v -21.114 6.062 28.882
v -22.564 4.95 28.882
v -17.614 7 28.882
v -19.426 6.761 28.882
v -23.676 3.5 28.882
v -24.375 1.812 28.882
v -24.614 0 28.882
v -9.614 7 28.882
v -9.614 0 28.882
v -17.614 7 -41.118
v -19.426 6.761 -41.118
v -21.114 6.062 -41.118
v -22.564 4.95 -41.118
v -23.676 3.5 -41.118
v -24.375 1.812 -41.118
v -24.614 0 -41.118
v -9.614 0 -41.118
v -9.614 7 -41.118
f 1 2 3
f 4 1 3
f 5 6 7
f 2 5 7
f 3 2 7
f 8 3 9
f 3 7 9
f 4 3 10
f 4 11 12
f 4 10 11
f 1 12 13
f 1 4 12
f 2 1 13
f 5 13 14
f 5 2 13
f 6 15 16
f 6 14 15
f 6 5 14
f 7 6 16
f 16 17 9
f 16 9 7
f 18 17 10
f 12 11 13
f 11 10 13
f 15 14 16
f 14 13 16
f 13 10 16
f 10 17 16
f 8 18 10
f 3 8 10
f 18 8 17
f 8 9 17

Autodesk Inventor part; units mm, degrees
ref_plane "YZ Plane" through (0, 0, 0) normal (1, 0, 0) x (0, 1, 0)
ref_plane "XZ Plane" through (0, 0, 0) normal (0, 1, 0) x (-1, 0, 0)
ref_plane "XY Plane" through (0, 0, 0) normal (0, 0, 1) x (1, 0, 0)
sketch "Sketch1" plane through (0, 0, 0) normal (0, 1, 0) x (-1, 0, 0)
  line L0 (24.6138, 28.8821) -> (9.6138, 28.8821)
  line L1 (9.6138, 28.8821) -> (9.6138, -41.1179)
  line L2 (9.6138, -41.1179) -> (24.6138, -41.1179)
  line L3 (24.6138, -41.1179) -> (24.6138, 28.8821)
  point P0 (0, 0)
  dimension "d0" = 70
  dimension "d1" = 15
extrude "Extrusion1" add sketch "Sketch1" along normal blind 7
fillet "Fillet1" radius 7 1 edges at (-24.6138, 7, -6.1179)
properties part number "Paper-holder-clip" material "Steel"
